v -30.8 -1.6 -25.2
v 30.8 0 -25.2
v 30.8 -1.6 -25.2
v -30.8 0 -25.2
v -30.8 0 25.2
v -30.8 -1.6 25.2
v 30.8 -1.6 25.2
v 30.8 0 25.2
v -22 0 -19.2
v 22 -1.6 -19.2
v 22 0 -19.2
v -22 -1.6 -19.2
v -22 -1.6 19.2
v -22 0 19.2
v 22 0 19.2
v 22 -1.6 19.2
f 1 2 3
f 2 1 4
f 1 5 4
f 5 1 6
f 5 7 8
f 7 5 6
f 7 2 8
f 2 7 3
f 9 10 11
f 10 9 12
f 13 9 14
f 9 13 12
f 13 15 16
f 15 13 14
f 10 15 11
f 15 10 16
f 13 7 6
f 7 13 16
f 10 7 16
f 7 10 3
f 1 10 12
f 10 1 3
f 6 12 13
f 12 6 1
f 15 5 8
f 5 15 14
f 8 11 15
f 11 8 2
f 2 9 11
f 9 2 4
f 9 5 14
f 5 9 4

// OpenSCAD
// file: ../p/4-4edge.scad
use <../lib.scad>
$fa=1; $fs=0.2;
function ldraw_lib__4_4edge(realsolid=false) = [
// 0 Circle 1.0
// 0 Name: 4-4edge.dat
// 0 Author: James Jessiman
// 0 !LDRAW_ORG Primitive UPDATE 2017-01
// 0 !LICENSE Licensed under CC BY 2.0 and CC BY 4.0 : see CAreadme.txt
// 
// 0 BFC CERTIFY CCW
  [0,"BFC","CERTIFY"],
  [0,"BFC","CCW"],
// 
// 0 !HISTORY 1998-12-15 [PTadmin] Official Update 1998-10
// 0 !HISTORY 2005-12-28 [PTadmin] Official Update 2005-01
// 0 !HISTORY 2007-06-24 [PTadmin] Header formatted for Contributor Agreement
// 0 !HISTORY 2008-07-01 [PTadmin] Official Update 2008-01
// 0 !HISTORY 2017-01-15 [Steffen] BFCed
// 0 !HISTORY 2017-12-30 [PTadmin] Official Update 2017-01
// 
// 
// 2 24 1 0 0 0.9239 0 0.3827
  [2,24,1,0,0,0.9239,0,0.3827],
// 2 24 0.9239 0 0.3827 0.7071 0 0.7071
  [2,24,0.9239,0,0.3827,0.7071,0,0.7071],
// 2 24 0.7071 0 0.7071 0.3827 0 0.9239
  [2,24,0.7071,0,0.7071,0.3827,0,0.9239],
// 2 24 0.3827 0 0.9239 0 0 1
  [2,24,0.3827,0,0.9239,0,0,1],
// 2 24 0 0 1 -0.3827 0 0.9239
  [2,24,0,0,1,-0.3827,0,0.9239],
// 2 24 -0.3827 0 0.9239 -0.7071 0 0.7071
  [2,24,-0.3827,0,0.9239,-0.7071,0,0.7071],
// 2 24 -0.7071 0 0.7071 -0.9239 0 0.3827
  [2,24,-0.7071,0,0.7071,-0.9239,0,0.3827],
// 2 24 -0.9239 0 0.3827 -1 0 -0
  [2,24,-0.9239,0,0.3827,-1,0,-0],
// 2 24 -1 0 -0 -0.9239 0 -0.3827
  [2,24,-1,0,-0,-0.9239,0,-0.3827],
// 2 24 -0.9239 0 -0.3827 -0.7071 0 -0.7071
  [2,24,-0.9239,0,-0.3827,-0.7071,0,-0.7071],
// 2 24 -0.7071 0 -0.7071 -0.3827 0 -0.9239
  [2,24,-0.7071,0,-0.7071,-0.3827,0,-0.9239],
// 2 24 -0.3827 0 -0.9239 0 0 -1
  [2,24,-0.3827,0,-0.9239,0,0,-1],
// 2 24 0 0 -1 0.3827 0 -0.9239
  [2,24,0,0,-1,0.3827,0,-0.9239],
// 2 24 0.3827 0 -0.9239 0.7071 0 -0.7071
  [2,24,0.3827,0,-0.9239,0.7071,0,-0.7071],
// 2 24 0.7071 0 -0.7071 0.9239 0 -0.3827
  [2,24,0.7071,0,-0.7071,0.9239,0,-0.3827],
// 2 24 0.9239 0 -0.3827 1 0 0
  [2,24,0.9239,0,-0.3827,1,0,0],
];
module ldraw_lib__4_4edge(step=0, col=false, unit=2/5, alt=false, line=0.2, solid=!$preview)
    makepoly(ldraw_lib__4_4edge(solid), step=step, col=col, unit=unit, alt=alt, line=line, solid=solid);
ldraw_lib__4_4edge(line=0.2);
// file: ../p/4-4disc.scad
use <../lib.scad>
$fa=1; $fs=0.2;
function ldraw_lib__4_4disc(realsolid=false) = [
// 0 Disc 1.0
// 0 Name: 4-4disc.dat
// 0 Author: James Jessiman
// 0 !LDRAW_ORG Primitive UPDATE 2002-02
// 0 !LICENSE Licensed under CC BY 2.0 and CC BY 4.0 : see CAreadme.txt
// 
// 0 BFC CERTIFY CCW
  [0,"BFC","CERTIFY"],
  [0,"BFC","CCW"],
// 
// 0 !HISTORY 1998-12-15 [PTadmin] Official Update 1998-10
// 0 !HISTORY 2002-03-23 [sbliss] Added BFC statement
// 0 !HISTORY 2002-04-25 [PTadmin] Official Update 2002-02
// 0 !HISTORY 2007-06-24 [PTadmin] Header formatted for Contributor Agreement
// 0 !HISTORY 2008-07-01 [PTadmin] Official Update 2008-01
// 
// 
// 3 16 0 0 0 1 0 0 0.9239 0 0.3827
  [3,16,0,0,0,1,0,0,0.9239,0,0.3827],
// 3 16 0 0 0 0.9239 0 0.3827 0.7071 0 0.7071
  [3,16,0,0,0,0.9239,0,0.3827,0.7071,0,0.7071],
// 3 16 0 0 0 0.7071 0 0.7071 0.3827 0 0.9239
  [3,16,0,0,0,0.7071,0,0.7071,0.3827,0,0.9239],
// 3 16 0 0 0 0.3827 0 0.9239 0 0 1
  [3,16,0,0,0,0.3827,0,0.9239,0,0,1],
// 3 16 0 0 0 0 0 1 -0.3827 0 0.9239
  [3,16,0,0,0,0,0,1,-0.3827,0,0.9239],
// 3 16 0 0 0 -0.3827 0 0.9239 -0.7071 0 0.7071
  [3,16,0,0,0,-0.3827,0,0.9239,-0.7071,0,0.7071],
// 3 16 0 0 0 -0.7071 0 0.7071 -0.9239 0 0.3827
  [3,16,0,0,0,-0.7071,0,0.7071,-0.9239,0,0.3827],
// 3 16 0 0 0 -0.9239 0 0.3827 -1 0 -0
  [3,16,0,0,0,-0.9239,0,0.3827,-1,0,-0],
// 3 16 0 0 0 -1 0 -0 -0.9239 0 -0.3827
  [3,16,0,0,0,-1,0,-0,-0.9239,0,-0.3827],
// 3 16 0 0 0 -0.9239 0 -0.3827 -0.7071 0 -0.7071
  [3,16,0,0,0,-0.9239,0,-0.3827,-0.7071,0,-0.7071],
// 3 16 0 0 0 -0.7071 0 -0.7071 -0.3827 0 -0.9239
  [3,16,0,0,0,-0.7071,0,-0.7071,-0.3827,0,-0.9239],
// 3 16 0 0 0 -0.3827 0 -0.9239 0 0 -1
  [3,16,0,0,0,-0.3827,0,-0.9239,0,0,-1],
// 3 16 0 0 0 0 0 -1 0.3827 0 -0.9239
  [3,16,0,0,0,0,0,-1,0.3827,0,-0.9239],
// 3 16 0 0 0 0.3827 0 -0.9239 0.7071 0 -0.7071
  [3,16,0,0,0,0.3827,0,-0.9239,0.7071,0,-0.7071],
// 3 16 0 0 0 0.7071 0 -0.7071 0.9239 0 -0.3827
  [3,16,0,0,0,0.7071,0,-0.7071,0.9239,0,-0.3827],
// 3 16 0 0 0 0.9239 0 -0.3827 1 0 0
  [3,16,0,0,0,0.9239,0,-0.3827,1,0,0],
// 0
];
module ldraw_lib__4_4disc(step=0, col=false, unit=2/5, alt=false, line=0.2, solid=!$preview)
    makepoly(ldraw_lib__4_4disc(solid), step=step, col=col, unit=unit, alt=alt, line=line, solid=solid);
ldraw_lib__4_4disc(line=0.2);
// file: ../p/4-4cyli.scad
use <../lib.scad>
$fa=1; $fs=0.2;
function ldraw_lib__4_4cyli(realsolid=false) = [
// 0 Cylinder 1.0
// 0 Name: 4-4cyli.dat
// 0 Author: James Jessiman
// 0 !LDRAW_ORG Primitive UPDATE 2005-01
// 0 !LICENSE Licensed under CC BY 2.0 and CC BY 4.0 : see CAreadme.txt
// 
// 0 BFC CERTIFY CCW
  [0,"BFC","CERTIFY"],
  [0,"BFC","CCW"],
// 
// 0 !HISTORY 1998-12-15 [PTadmin] Official Update 1998-10
// 0 !HISTORY 2002-03-23 [sbliss] Added BFC statement; merged headers from files in distributions LDraw 0.27 and Complete.
// 0 !HISTORY 2002-04-25 [PTadmin] Official Update 2002-02
// 0 !HISTORY 2004-12-14 [guyvivan] BFC CCW
// 0 !HISTORY 2005-12-28 [PTadmin] Official Update 2005-01
// 0 !HISTORY 2007-06-24 [PTadmin] Header formatted for Contributor Agreement
// 0 !HISTORY 2008-07-01 [PTadmin] Official Update 2008-01
// 
// 
// 4 16 1 1 0 0.9239 1 0.3827 0.9239 0 0.3827 1 0 0
  [4,16,1,1,0,0.9239,1,0.3827,0.9239,0,0.3827,1,0,0],
// 5 24 1 0 0 1 1 0 0.9239 0 0.3827 0.9239 0 -0.3827
  [5,24,1,0,0,1,1,0,0.9239,0,0.3827,0.9239,0,-0.3827],
// 4 16 0.9239 1 0.3827 0.7071 1 0.7071 0.7071 0 0.7071 0.9239 0 0.3827
  [4,16,0.9239,1,0.3827,0.7071,1,0.7071,0.7071,0,0.7071,0.9239,0,0.3827],
// 5 24 0.9239 0 0.3827 0.9239 1 0.3827 0.7071 0 0.7071 1 0 0
  [5,24,0.9239,0,0.3827,0.9239,1,0.3827,0.7071,0,0.7071,1,0,0],
// 4 16 0.7071 1 0.7071 0.3827 1 0.9239 0.3827 0 0.9239 0.7071 0 0.7071
  [4,16,0.7071,1,0.7071,0.3827,1,0.9239,0.3827,0,0.9239,0.7071,0,0.7071],
// 5 24 0.7071 0 0.7071 0.7071 1 0.7071 0.3827 0 0.9239 0.9239 0 0.3827
  [5,24,0.7071,0,0.7071,0.7071,1,0.7071,0.3827,0,0.9239,0.9239,0,0.3827],
// 4 16 0.3827 1 0.9239 0 1 1 0 0 1 0.3827 0 0.9239
  [4,16,0.3827,1,0.9239,0,1,1,0,0,1,0.3827,0,0.9239],
// 5 24 0.3827 0 0.9239 0.3827 1 0.9239 0 0 1 0.7071 0 0.7071
  [5,24,0.3827,0,0.9239,0.3827,1,0.9239,0,0,1,0.7071,0,0.7071],
// 4 16 0 1 1 -0.3827 1 0.9239 -0.3827 0 0.9239 0 0 1
  [4,16,0,1,1,-0.3827,1,0.9239,-0.3827,0,0.9239,0,0,1],
// 5 24 0 0 1 0 1 1 -0.3827 0 0.9239 0.3827 0 0.9239
  [5,24,0,0,1,0,1,1,-0.3827,0,0.9239,0.3827,0,0.9239],
// 4 16 -0.3827 1 0.9239 -0.7071 1 0.7071 -0.7071 0 0.7071 -0.3827 0 0.9239
  [4,16,-0.3827,1,0.9239,-0.7071,1,0.7071,-0.7071,0,0.7071,-0.3827,0,0.9239],
// 5 24 -0.3827 0 0.9239 -0.3827 1 0.9239 -0.7071 0 0.7071 0 0 1
  [5,24,-0.3827,0,0.9239,-0.3827,1,0.9239,-0.7071,0,0.7071,0,0,1],
// 4 16 -0.7071 1 0.7071 -0.9239 1 0.3827 -0.9239 0 0.3827 -0.7071 0 0.7071
  [4,16,-0.7071,1,0.7071,-0.9239,1,0.3827,-0.9239,0,0.3827,-0.7071,0,0.7071],
// 5 24 -0.7071 0 0.7071 -0.7071 1 0.7071 -0.9239 0 0.3827 -0.3827 0 0.9239
  [5,24,-0.7071,0,0.7071,-0.7071,1,0.7071,-0.9239,0,0.3827,-0.3827,0,0.9239],
// 4 16 -0.9239 1 0.3827 -1 1 0 -1 0 0 -0.9239 0 0.3827
  [4,16,-0.9239,1,0.3827,-1,1,0,-1,0,0,-0.9239,0,0.3827],
// 5 24 -0.9239 0 0.3827 -0.9239 1 0.3827 -1 0 0 -0.7071 0 0.7071
  [5,24,-0.9239,0,0.3827,-0.9239,1,0.3827,-1,0,0,-0.7071,0,0.7071],
// 4 16 -1 1 0 -0.9239 1 -0.3827 -0.9239 0 -0.3827 -1 0 0
  [4,16,-1,1,0,-0.9239,1,-0.3827,-0.9239,0,-0.3827,-1,0,0],
// 5 24 -1 0 0 -1 1 0 -0.9239 0 -0.3827 -0.9239 0 0.3827
  [5,24,-1,0,0,-1,1,0,-0.9239,0,-0.3827,-0.9239,0,0.3827],
// 4 16 -0.9239 1 -0.3827 -0.7071 1 -0.7071 -0.7071 0 -0.7071 -0.9239 0 -0.3827
  [4,16,-0.9239,1,-0.3827,-0.7071,1,-0.7071,-0.7071,0,-0.7071,-0.9239,0,-0.3827],
// 5 24 -0.9239 0 -0.3827 -0.9239 1 -0.3827 -0.7071 0 -0.7071 -1 0 0
  [5,24,-0.9239,0,-0.3827,-0.9239,1,-0.3827,-0.7071,0,-0.7071,-1,0,0],
// 4 16 -0.7071 1 -0.7071 -0.3827 1 -0.9239 -0.3827 0 -0.9239 -0.7071 0 -0.7071
  [4,16,-0.7071,1,-0.7071,-0.3827,1,-0.9239,-0.3827,0,-0.9239,-0.7071,0,-0.7071],
// 5 24 -0.7071 0 -0.7071 -0.7071 1 -0.7071 -0.3827 0 -0.9239 -0.9239 0 -0.3827
  [5,24,-0.7071,0,-0.7071,-0.7071,1,-0.7071,-0.3827,0,-0.9239,-0.9239,0,-0.3827],
// 4 16 -0.3827 1 -0.9239 0 1 -1 0 0 -1 -0.3827 0 -0.9239
  [4,16,-0.3827,1,-0.9239,0,1,-1,0,0,-1,-0.3827,0,-0.9239],
// 5 24 -0.3827 0 -0.9239 -0.3827 1 -0.9239 0 0 -1 -0.7071 0 -0.7071
  [5,24,-0.3827,0,-0.9239,-0.3827,1,-0.9239,0,0,-1,-0.7071,0,-0.7071],
// 4 16 0 1 -1 0.3827 1 -0.9239 0.3827 0 -0.9239 0 0 -1
  [4,16,0,1,-1,0.3827,1,-0.9239,0.3827,0,-0.9239,0,0,-1],
// 5 24 0 0 -1 0 1 -1 0.3827 0 -0.9239 -0.3827 0 -0.9239
  [5,24,0,0,-1,0,1,-1,0.3827,0,-0.9239,-0.3827,0,-0.9239],
// 4 16 0.3827 1 -0.9239 0.7071 1 -0.7071 0.7071 0 -0.7071 0.3827 0 -0.9239
  [4,16,0.3827,1,-0.9239,0.7071,1,-0.7071,0.7071,0,-0.7071,0.3827,0,-0.9239],
// 5 24 0.3827 0 -0.9239 0.3827 1 -0.9239 0.7071 0 -0.7071 0 0 -1
  [5,24,0.3827,0,-0.9239,0.3827,1,-0.9239,0.7071,0,-0.7071,0,0,-1],
// 4 16 0.7071 1 -0.7071 0.9239 1 -0.3827 0.9239 0 -0.3827 0.7071 0 -0.7071
  [4,16,0.7071,1,-0.7071,0.9239,1,-0.3827,0.9239,0,-0.3827,0.7071,0,-0.7071],
// 5 24 0.7071 0 -0.7071 0.7071 1 -0.7071 0.9239 0 -0.3827 0.3827 0 -0.9239
  [5,24,0.7071,0,-0.7071,0.7071,1,-0.7071,0.9239,0,-0.3827,0.3827,0,-0.9239],
// 4 16 0.9239 1 -0.3827 1 1 0 1 0 0 0.9239 0 -0.3827
  [4,16,0.9239,1,-0.3827,1,1,0,1,0,0,0.9239,0,-0.3827],
// 5 24 0.9239 0 -0.3827 0.9239 1 -0.3827 1 0 0 0.7071 0 -0.7071
  [5,24,0.9239,0,-0.3827,0.9239,1,-0.3827,1,0,0,0.7071,0,-0.7071],
// 0
];
module ldraw_lib__4_4cyli(step=0, col=false, unit=2/5, alt=false, line=0.2, solid=!$preview)
    makepoly(ldraw_lib__4_4cyli(solid), step=step, col=col, unit=unit, alt=alt, line=line, solid=solid);
ldraw_lib__4_4cyli(line=0.2);
// file: ../p/stud3.scad
use <../lib.scad>
use <4-4cyli.scad>
use <4-4disc.scad>
use <4-4edge.scad>
$fa=1; $fs=0.2;
function ldraw_lib__stud3(realsolid=false) = realsolid ? 
    [openscad(translate([0,0,-eps()], o=cylinder(4+eps(), r=4)),2)] : [
// 0 Stud Tube Solid
// 0 Name: stud3.dat
// 0 Author: James Jessiman
// 0 !LDRAW_ORG Primitive UPDATE 2012-01
// 0 !LICENSE Licensed under CC BY 2.0 and CC BY 4.0 : see CAreadme.txt
// 
// 0 BFC CERTIFY CCW
  [0,"BFC","CERTIFY"],
  [0,"BFC","CCW"],
// 
// 0 !HISTORY 2002-04-04 [sbliss] Modified for BFC compliance
// 0 !HISTORY 2002-04-25 [PTadmin] Official Update 2002-02
// 0 !HISTORY 2007-06-24 [PTadmin] Header formatted for Contributor Agreement
// 0 !HISTORY 2008-07-01 [PTadmin] Official Update 2008-01
// 0 !HISTORY 2012-02-16 [Philo] Changed to CCW
// 0 !HISTORY 2012-03-30 [PTadmin] Official Update 2012-01
// 
// 
// 1 16 0 -4 0 4 0 0 0 1 0 0 0 4 4-4edge.dat
  [1,16,0,-4,0,4,0,0,0,1,0,0,0,4, ldraw_lib__4_4edge(realsolid)],
// 1 16 0 0 0 4 0 0 0 1 0 0 0 4 4-4edge.dat
  [1,16,0,0,0,4,0,0,0,1,0,0,0,4, ldraw_lib__4_4edge(realsolid)],
// 1 16 0 -4 0 4 0 0 0 1 0 0 0 4 4-4disc.dat
  [1,16,0,-4,0,4,0,0,0,1,0,0,0,4, ldraw_lib__4_4disc(realsolid)],
// 1 16 0 -4 0 4 0 0 0 4 0 0 0 4 4-4cyli.dat
  [1,16,0,-4,0,4,0,0,0,4,0,0,0,4, ldraw_lib__4_4cyli(realsolid)],
];
module ldraw_lib__stud3(step=0, col=false, unit=2/5, alt=false, line=0.2, solid=!$preview)
    makepoly(ldraw_lib__stud3(solid), step=step, col=col, unit=unit, alt=alt, line=line, solid=solid);
ldraw_lib__stud3(line=0.2);
// file: ../p/stud.scad
use <../lib.scad>
use <4-4cyli.scad>
use <4-4disc.scad>
use <4-4edge.scad>
$fa=1; $fs=0.2;
function ldraw_lib__stud(realsolid=false) = realsolid ? 
    [openscad(translate([0,0,-eps()], o=cylinder(4+eps(), r=6)),2)] : [
// 0 Stud
// 0 Name: stud.dat
// 0 Author: James Jessiman
// 0 !LDRAW_ORG Primitive UPDATE 2012-01
// 0 !LICENSE Licensed under CC BY 2.0 and CC BY 4.0 : see CAreadme.txt
// 
// 0 BFC CERTIFY CCW
  [0,"BFC","CERTIFY"],
  [0,"BFC","CCW"],
// 
// 0 !HISTORY 2002-04-04 [sbliss] Modified for BFC compliance
// 0 !HISTORY 2002-04-25 [PTadmin] Official Update 2002-02
// 0 !HISTORY 2007-06-24 [PTadmin] Header formatted for Contributor Agreement
// 0 !HISTORY 2008-07-01 [PTadmin] Official Update 2008-01
// 0 !HISTORY 2012-02-16 [Philo] Changed to CCW
// 0 !HISTORY 2012-03-30 [PTadmin] Official Update 2012-01
// 
// 
// 1 16 0 0 0 6 0 0 0 1 0 0 0 6 4-4edge.dat
  [1,16,0,0,0,6,0,0,0,1,0,0,0,6, ldraw_lib__4_4edge(realsolid)],
// 1 16 0 -4 0 6 0 0 0 1 0 0 0 6 4-4edge.dat
  [1,16,0,-4,0,6,0,0,0,1,0,0,0,6, ldraw_lib__4_4edge(realsolid)],
// 1 16 0 0 0 6 0 0 0 -4 0 0 0 6 4-4cyli.dat
  [1,16,0,0,0,6,0,0,0,-4,0,0,0,6, ldraw_lib__4_4cyli(realsolid)],
// 1 16 0 -4 0 6 0 0 0 1 0 0 0 6 4-4disc.dat
  [1,16,0,-4,0,6,0,0,0,1,0,0,0,6, ldraw_lib__4_4disc(realsolid)],
];
module ldraw_lib__stud(step=0, col=false, unit=2/5, alt=false, line=0.2, solid=!$preview)
    makepoly(ldraw_lib__stud(solid), step=step, col=col, unit=unit, alt=alt, line=line, solid=solid);
ldraw_lib__stud(line=0.2);
// file: ../p/box5.scad
use <../lib.scad>
$fa=1; $fs=0.2;
function ldraw_lib__box5(realsolid=false) = [
// 0 Box with 5 Faces and All Edges
// 0 Name: box5.dat
// 0 Author: James Jessiman
// 0 !LDRAW_ORG Primitive UPDATE 2012-01
// 0 !LICENSE Licensed under CC BY 2.0 and CC BY 4.0 : see CAreadme.txt
// 
// 0 BFC CERTIFY CCW
  [0,"BFC","CERTIFY"],
  [0,"BFC","CCW"],
// 
// 0 !HISTORY 2002-04-03 [sbliss] Modified for BFC compliance
// 0 !HISTORY 2002-04-25 [PTadmin] Official Update 2002-02
// 0 !HISTORY 2007-06-24 [PTadmin] Header formatted for Contributor Agreement
// 0 !HISTORY 2008-07-01 [PTadmin] Official Update 2008-01
// 0 !HISTORY 2012-02-16 [Philo] Changed to CCW
// 0 !HISTORY 2012-03-30 [PTadmin] Official Update 2012-01
// 
// 
// 2 24 1 1 1 -1 1 1
  [2,24,1,1,1,-1,1,1],
// 2 24 -1 1 1 -1 1 -1
  [2,24,-1,1,1,-1,1,-1],
// 2 24 -1 1 -1 1 1 -1
  [2,24,-1,1,-1,1,1,-1],
// 2 24 1 1 -1 1 1 1
  [2,24,1,1,-1,1,1,1],
// 2 24 1 0 1 -1 0 1
  [2,24,1,0,1,-1,0,1],
// 2 24 -1 0 1 -1 0 -1
  [2,24,-1,0,1,-1,0,-1],
// 2 24 -1 0 -1 1 0 -1
  [2,24,-1,0,-1,1,0,-1],
// 2 24 1 0 -1 1 0 1
  [2,24,1,0,-1,1,0,1],
// 2 24 1 0 1 1 1 1
  [2,24,1,0,1,1,1,1],
// 2 24 -1 0 1 -1 1 1
  [2,24,-1,0,1,-1,1,1],
// 2 24 1 0 -1 1 1 -1
  [2,24,1,0,-1,1,1,-1],
// 2 24 -1 0 -1 -1 1 -1
  [2,24,-1,0,-1,-1,1,-1],
// 4 16 -1 1 1 1 1 1 1 1 -1 -1 1 -1
  [4,16,-1,1,1,1,1,1,1,1,-1,-1,1,-1],
// 4 16 -1 1 1 -1 0 1 1 0 1 1 1 1
  [4,16,-1,1,1,-1,0,1,1,0,1,1,1,1],
// 4 16 -1 1 -1 -1 0 -1 -1 0 1 -1 1 1
  [4,16,-1,1,-1,-1,0,-1,-1,0,1,-1,1,1],
// 4 16 1 1 -1 1 0 -1 -1 0 -1 -1 1 -1
  [4,16,1,1,-1,1,0,-1,-1,0,-1,-1,1,-1],
// 4 16 1 1 1 1 0 1 1 0 -1 1 1 -1
  [4,16,1,1,1,1,0,1,1,0,-1,1,1,-1],
];
module ldraw_lib__box5(step=0, col=false, unit=2/5, alt=false, line=0.2, solid=!$preview)
    makepoly(ldraw_lib__box5(solid), step=step, col=col, unit=unit, alt=alt, line=line, solid=solid);
ldraw_lib__box5(line=0.2);
// file: ../p/box4t.scad
use <../lib.scad>
$fa=1; $fs=0.2;
function ldraw_lib__box4t(realsolid=false) = [
// 0 Box with 4 Adjacent Faces and All Edges
// 0 Name: box4t.dat
// 0 Author: Tore Eriksson [Tore_Eriksson]
// 0 !LDRAW_ORG Primitive UPDATE 2003-02
// 0 !LICENSE Licensed under CC BY 2.0 and CC BY 4.0 : see CAreadme.txt
// 
// 0 BFC CERTIFY CCW
  [0,"BFC","CERTIFY"],
  [0,"BFC","CCW"],
// 
// 0 !HISTORY 1997-09-29 [PTadmin] Official Update 1997-15
// 0 !HISTORY 2002-08-31 [izanette] Modified with WINDZ for BFC compliance
// 0 !HISTORY 2003-08-01 [PTadmin] Official Update 2003-02
// 0 !HISTORY 2007-06-24 [PTadmin] Header formatted for Contributor Agreement
// 0 !HISTORY 2008-07-01 [PTadmin] Official Update 2008-01
// 
// 
// 2 24 1 1 1 -1 1 1
  [2,24,1,1,1,-1,1,1],
// 2 24 -1 1 1 -1 1 -1
  [2,24,-1,1,1,-1,1,-1],
// 2 24 -1 1 -1 1 1 -1
  [2,24,-1,1,-1,1,1,-1],
// 2 24 1 1 -1 1 1 1
  [2,24,1,1,-1,1,1,1],
// 2 24 1 0 1 -1 0 1
  [2,24,1,0,1,-1,0,1],
// 2 24 -1 0 1 -1 0 -1
  [2,24,-1,0,1,-1,0,-1],
// 2 24 -1 0 -1 1 0 -1
  [2,24,-1,0,-1,1,0,-1],
// 2 24 1 0 -1 1 0 1
  [2,24,1,0,-1,1,0,1],
// 2 24 1 0 1 1 1 1
  [2,24,1,0,1,1,1,1],
// 2 24 -1 0 1 -1 1 1
  [2,24,-1,0,1,-1,1,1],
// 2 24 1 0 -1 1 1 -1
  [2,24,1,0,-1,1,1,-1],
// 2 24 -1 0 -1 -1 1 -1
  [2,24,-1,0,-1,-1,1,-1],
// 4 16 1 1 1 1 1 -1 -1 1 -1 -1 1 1
  [4,16,1,1,1,1,1,-1,-1,1,-1,-1,1,1],
// 4 16 1 1 1 -1 1 1 -1 0 1 1 0 1
  [4,16,1,1,1,-1,1,1,-1,0,1,1,0,1],
// 4 16 -1 1 1 -1 1 -1 -1 0 -1 -1 0 1
  [4,16,-1,1,1,-1,1,-1,-1,0,-1,-1,0,1],
// 0 4 16 -1 1 -1 -1 0 -1 1 0 -1 1 1 -1
// 4 16 1 1 -1 1 1 1 1 0 1 1 0 -1
  [4,16,1,1,-1,1,1,1,1,0,1,1,0,-1],
// 0
];
module ldraw_lib__box4t(step=0, col=false, unit=2/5, alt=false, line=0.2, solid=!$preview)
    makepoly(ldraw_lib__box4t(solid), step=step, col=col, unit=unit, alt=alt, line=line, solid=solid);
ldraw_lib__box4t(line=0.2);
// file: s/3004s01.scad
use <../../lib.scad>
use <../../p/box4t.scad>
use <../../p/box5.scad>
use <../../p/stud.scad>
use <../../p/stud3.scad>
$fa=1; $fs=0.2;
function ldraw_lib__s__3004s01(realsolid=false) = [
// 0 ~Brick  1 x  2 without Front Face
// 0 Name: s\3004s01.dat
// 0 Author: James Jessiman
// 0 !LDRAW_ORG Subpart UPDATE 2003-03
// 0 !LICENSE Licensed under CC BY 2.0 and CC BY 4.0 : see CAreadme.txt
// 
// 0 BFC CERTIFY CCW
  [0,"BFC","CERTIFY"],
  [0,"BFC","CCW"],
// 
// 0 !HISTORY 2003-09-07 [jriley] Subfiling, BFC
// 0 !HISTORY 2003-12-19 [PTadmin] Official Update 2003-03
// 0 !HISTORY 2007-08-29 [PTadmin] Header formatted for Contributor Agreement
// 0 !HISTORY 2008-07-01 [PTadmin] Official Update 2008-01
// 
// 
// 1 16 0 4 0 1 0 0 0 -5 0 0 0 1 stud3.dat
  [1,16,0,4,0,1,0,0,0,-5,0,0,0,1, ldraw_lib__stud3(realsolid)],
// 0 BFC INVERTNEXT
  [0,"BFC","INVERTNEXT"],
// 1 16 0 24 0 16 0 0 0 -20 0 0 0 6 box5.dat
  [1,16,0,24,0,16,0,0,0,-20,0,0,0,6, ldraw_lib__box5(realsolid)],
// 4 16 20 24 10 16 24 6 -16 24 6 -20 24 10
  [4,16,20,24,10,16,24,6,-16,24,6,-20,24,10],
// 4 16 -20 24 10 -16 24 6 -16 24 -6 -20 24 -10
  [4,16,-20,24,10,-16,24,6,-16,24,-6,-20,24,-10],
// 4 16 -20 24 -10 -16 24 -6 16 24 -6 20 24 -10
  [4,16,-20,24,-10,-16,24,-6,16,24,-6,20,24,-10],
// 4 16 20 24 -10 16 24 -6 16 24 6 20 24 10
  [4,16,20,24,-10,16,24,-6,16,24,6,20,24,10],
// 1 16 0 24 0 20 0 0 0 -24 0 0 0 10 box4t.dat
  [1,16,0,24,0,20,0,0,0,-24,0,0,0,10, ldraw_lib__box4t(realsolid)],
// 1 16 10 0 0 1 0 0 0 1 0 0 0 1 stud.dat
  [1,16,10,0,0,1,0,0,0,1,0,0,0,1, ldraw_lib__stud(realsolid)],
// 1 16 -10 0 0 1 0 0 0 1 0 0 0 1 stud.dat
  [1,16,-10,0,0,1,0,0,0,1,0,0,0,1, ldraw_lib__stud(realsolid)],
// 0
];
module ldraw_lib__s__3004s01(step=0, col=false, unit=2/5, alt=false, line=0.2, solid=!$preview)
    makepoly(ldraw_lib__s__3004s01(solid), step=step, col=col, unit=unit, alt=alt, line=line, solid=solid);
ldraw_lib__s__3004s01(line=0.2);
// file: 3004.scad
use <../lib.scad>
use <s/3004s01.scad>
$fa=1; $fs=0.2;
function ldraw_lib__3004(realsolid=false) = [
// 0 Brick  1 x  2
// 0 Name: 3004.dat
// 0 Author: James Jessiman
// 0 !LDRAW_ORG Part UPDATE 2022-05
// 0 !LICENSE Licensed under CC BY 2.0 and CC BY 4.0 : see CAreadme.txt
// 
// 0 BFC CERTIFY CCW
  [0,"BFC","CERTIFY"],
  [0,"BFC","CCW"],
// 
// 0 !HISTORY 2001-10-26 [PTadmin] Official Update 2001-01
// 0 !HISTORY 2002-05-07 {unknown} BFC Certification
// 0 !HISTORY 2002-06-11 [PTadmin] Official Update 2002-03
// 0 !HISTORY 2007-05-07 [PTadmin] Header formatted for Contributor Agreement
// 0 !HISTORY 2008-07-01 [PTadmin] Official Update 2008-01
// 0 !HISTORY 2022-08-04 [MagFors] Using subfile
// 0 !HISTORY 2022-09-15 [PTadmin] Official Update 2022-05
// 
// 
// 1 16 0 0 0 1 0 0 0 1 0 0 0 1 s\3004s01.dat
  [1,16,0,0,0,1,0,0,0,1,0,0,0,1, ldraw_lib__s__3004s01(realsolid)],
// 4 16 -20 24 -10 20 24 -10 20 0 -10 -20 0 -10
  [4,16,-20,24,-10,20,24,-10,20,0,-10,-20,0,-10],
];
module ldraw_lib__3004(step=0, col=false, unit=2/5, alt=false, line=0.2, solid=!$preview)
    makepoly(ldraw_lib__3004(solid), step=step, col=col, unit=unit, alt=alt, line=line, solid=solid);
ldraw_lib__3004(line=0.2);
// file: ../p/box4.scad
use <../lib.scad>
$fa=1; $fs=0.2;
function ldraw_lib__box4(realsolid=false) = [
// 0 Box with 4 Faces (2 Parallel Pairs) and All Edges
// 0 Name: box4.dat
// 0 Author: James Jessiman
// 0 !LDRAW_ORG Primitive UPDATE 2012-01
// 0 !LICENSE Licensed under CC BY 2.0 and CC BY 4.0 : see CAreadme.txt
// 
// 0 BFC CERTIFY CCW
  [0,"BFC","CERTIFY"],
  [0,"BFC","CCW"],
// 
// 0 !HISTORY 2002-04-03 [sbliss] Modified for BFC compliance
// 0 !HISTORY 2002-04-25 [PTadmin] Official Update 2002-02
// 0 !HISTORY 2007-06-24 [PTadmin] Header formatted for Contributor Agreement
// 0 !HISTORY 2008-07-01 [PTadmin] Official Update 2008-01
// 0 !HISTORY 2012-02-16 [Philo] Changed to CCW
// 0 !HISTORY 2012-03-30 [PTadmin] Official Update 2012-01
// 
// 
// 2 24 1 1 1 -1 1 1
  [2,24,1,1,1,-1,1,1],
// 2 24 -1 1 1 -1 1 -1
  [2,24,-1,1,1,-1,1,-1],
// 2 24 -1 1 -1 1 1 -1
  [2,24,-1,1,-1,1,1,-1],
// 2 24 1 1 -1 1 1 1
  [2,24,1,1,-1,1,1,1],
// 2 24 1 0 1 -1 0 1
  [2,24,1,0,1,-1,0,1],
// 2 24 -1 0 1 -1 0 -1
  [2,24,-1,0,1,-1,0,-1],
// 2 24 -1 0 -1 1 0 -1
  [2,24,-1,0,-1,1,0,-1],
// 2 24 1 0 -1 1 0 1
  [2,24,1,0,-1,1,0,1],
// 2 24 1 0 1 1 1 1
  [2,24,1,0,1,1,1,1],
// 2 24 -1 0 1 -1 1 1
  [2,24,-1,0,1,-1,1,1],
// 2 24 1 0 -1 1 1 -1
  [2,24,1,0,-1,1,1,-1],
// 2 24 -1 0 -1 -1 1 -1
  [2,24,-1,0,-1,-1,1,-1],
// 4 16 -1 1 1 -1 0 1 1 0 1 1 1 1
  [4,16,-1,1,1,-1,0,1,1,0,1,1,1,1],
// 4 16 -1 1 -1 -1 0 -1 -1 0 1 -1 1 1
  [4,16,-1,1,-1,-1,0,-1,-1,0,1,-1,1,1],
// 4 16 1 1 -1 1 0 -1 -1 0 -1 -1 1 -1
  [4,16,1,1,-1,1,0,-1,-1,0,-1,-1,1,-1],
// 4 16 1 1 1 1 0 1 1 0 -1 1 1 -1
  [4,16,1,1,1,1,0,1,1,0,-1,1,1,-1],
];
module ldraw_lib__box4(step=0, col=false, unit=2/5, alt=false, line=0.2, solid=!$preview)
    makepoly(ldraw_lib__box4(solid), step=step, col=col, unit=unit, alt=alt, line=line, solid=solid);
ldraw_lib__box4(line=0.2);
// main file
use <../lib.scad>
use <../p/box4.scad>
$fa=1; $fs=0.2;
function ldraw_lib__4252(realsolid=false) = [
// 0 ~Duplo Door Frame  2 x  4 x  3 with Flat Rim Back Panel
// 0 Name: 4252.dat
// 0 Author: Philippe Hurbain [Philo]
// 0 !LDRAW_ORG Part UPDATE 2022-06
// 0 !LICENSE Licensed under CC BY 2.0 and CC BY 4.0 : see CAreadme.txt
// 
// 0 BFC CERTIFY CCW
  [0,"BFC","CERTIFY"],
  [0,"BFC","CCW"],
// 
// 0 !CATEGORY Door
// 
// 0 !HISTORY 2022-12-20 [PTadmin] Official Update 2022-06
// 
// 
// 1 16 0 0 0 77 0 0 0 0 63 0 -4 0 box4.dat
  [1,16,0,0,0,77,0,0,0,0,63,0,-4,0, ldraw_lib__box4(realsolid)],
// 0 BFC INVERTNEXT
  [0,"BFC","INVERTNEXT"],
// 1 16 0 0 0 55 0 0 0 0 48 0 -4 0 box4.dat
  [1,16,0,0,0,55,0,0,0,0,48,0,-4,0, ldraw_lib__box4(realsolid)],
// 4 16 -77 -63 -4 -55 -48 -4 55 -48 -4 77 -63 -4
  [4,16,-77,-63,-4,-55,-48,-4,55,-48,-4,77,-63,-4],
// 4 16 77 -63 -4 55 -48 -4 55 48 -4 77 63 -4
  [4,16,77,-63,-4,55,-48,-4,55,48,-4,77,63,-4],
// 4 16 -77 63 -4 77 63 -4 55 48 -4 -55 48 -4
  [4,16,-77,63,-4,77,63,-4,55,48,-4,-55,48,-4],
// 4 16 -77 -63 -4 -77 63 -4 -55 48 -4 -55 -48 -4
  [4,16,-77,-63,-4,-77,63,-4,-55,48,-4,-55,-48,-4],
// 4 16 55 -48 0 -55 -48 0 -77 -63 0 77 -63 0
  [4,16,55,-48,0,-55,-48,0,-77,-63,0,77,-63,0],
// 4 16 55 48 0 55 -48 0 77 -63 0 77 63 0
  [4,16,55,48,0,55,-48,0,77,-63,0,77,63,0],
// 4 16 55 48 0 77 63 0 -77 63 0 -55 48 0
  [4,16,55,48,0,77,63,0,-77,63,0,-55,48,0],
// 4 16 -55 48 0 -77 63 0 -77 -63 0 -55 -48 0
  [4,16,-55,48,0,-77,63,0,-77,-63,0,-55,-48,0],
];
module ldraw_lib__4252(step=0, col=false, unit=2/5, alt=false, line=0.2, solid=!$preview)
    makepoly(ldraw_lib__4252(solid), step=step, col=col, unit=unit, alt=alt, line=line, solid=solid);
ldraw_lib__4252(line=0.2);
